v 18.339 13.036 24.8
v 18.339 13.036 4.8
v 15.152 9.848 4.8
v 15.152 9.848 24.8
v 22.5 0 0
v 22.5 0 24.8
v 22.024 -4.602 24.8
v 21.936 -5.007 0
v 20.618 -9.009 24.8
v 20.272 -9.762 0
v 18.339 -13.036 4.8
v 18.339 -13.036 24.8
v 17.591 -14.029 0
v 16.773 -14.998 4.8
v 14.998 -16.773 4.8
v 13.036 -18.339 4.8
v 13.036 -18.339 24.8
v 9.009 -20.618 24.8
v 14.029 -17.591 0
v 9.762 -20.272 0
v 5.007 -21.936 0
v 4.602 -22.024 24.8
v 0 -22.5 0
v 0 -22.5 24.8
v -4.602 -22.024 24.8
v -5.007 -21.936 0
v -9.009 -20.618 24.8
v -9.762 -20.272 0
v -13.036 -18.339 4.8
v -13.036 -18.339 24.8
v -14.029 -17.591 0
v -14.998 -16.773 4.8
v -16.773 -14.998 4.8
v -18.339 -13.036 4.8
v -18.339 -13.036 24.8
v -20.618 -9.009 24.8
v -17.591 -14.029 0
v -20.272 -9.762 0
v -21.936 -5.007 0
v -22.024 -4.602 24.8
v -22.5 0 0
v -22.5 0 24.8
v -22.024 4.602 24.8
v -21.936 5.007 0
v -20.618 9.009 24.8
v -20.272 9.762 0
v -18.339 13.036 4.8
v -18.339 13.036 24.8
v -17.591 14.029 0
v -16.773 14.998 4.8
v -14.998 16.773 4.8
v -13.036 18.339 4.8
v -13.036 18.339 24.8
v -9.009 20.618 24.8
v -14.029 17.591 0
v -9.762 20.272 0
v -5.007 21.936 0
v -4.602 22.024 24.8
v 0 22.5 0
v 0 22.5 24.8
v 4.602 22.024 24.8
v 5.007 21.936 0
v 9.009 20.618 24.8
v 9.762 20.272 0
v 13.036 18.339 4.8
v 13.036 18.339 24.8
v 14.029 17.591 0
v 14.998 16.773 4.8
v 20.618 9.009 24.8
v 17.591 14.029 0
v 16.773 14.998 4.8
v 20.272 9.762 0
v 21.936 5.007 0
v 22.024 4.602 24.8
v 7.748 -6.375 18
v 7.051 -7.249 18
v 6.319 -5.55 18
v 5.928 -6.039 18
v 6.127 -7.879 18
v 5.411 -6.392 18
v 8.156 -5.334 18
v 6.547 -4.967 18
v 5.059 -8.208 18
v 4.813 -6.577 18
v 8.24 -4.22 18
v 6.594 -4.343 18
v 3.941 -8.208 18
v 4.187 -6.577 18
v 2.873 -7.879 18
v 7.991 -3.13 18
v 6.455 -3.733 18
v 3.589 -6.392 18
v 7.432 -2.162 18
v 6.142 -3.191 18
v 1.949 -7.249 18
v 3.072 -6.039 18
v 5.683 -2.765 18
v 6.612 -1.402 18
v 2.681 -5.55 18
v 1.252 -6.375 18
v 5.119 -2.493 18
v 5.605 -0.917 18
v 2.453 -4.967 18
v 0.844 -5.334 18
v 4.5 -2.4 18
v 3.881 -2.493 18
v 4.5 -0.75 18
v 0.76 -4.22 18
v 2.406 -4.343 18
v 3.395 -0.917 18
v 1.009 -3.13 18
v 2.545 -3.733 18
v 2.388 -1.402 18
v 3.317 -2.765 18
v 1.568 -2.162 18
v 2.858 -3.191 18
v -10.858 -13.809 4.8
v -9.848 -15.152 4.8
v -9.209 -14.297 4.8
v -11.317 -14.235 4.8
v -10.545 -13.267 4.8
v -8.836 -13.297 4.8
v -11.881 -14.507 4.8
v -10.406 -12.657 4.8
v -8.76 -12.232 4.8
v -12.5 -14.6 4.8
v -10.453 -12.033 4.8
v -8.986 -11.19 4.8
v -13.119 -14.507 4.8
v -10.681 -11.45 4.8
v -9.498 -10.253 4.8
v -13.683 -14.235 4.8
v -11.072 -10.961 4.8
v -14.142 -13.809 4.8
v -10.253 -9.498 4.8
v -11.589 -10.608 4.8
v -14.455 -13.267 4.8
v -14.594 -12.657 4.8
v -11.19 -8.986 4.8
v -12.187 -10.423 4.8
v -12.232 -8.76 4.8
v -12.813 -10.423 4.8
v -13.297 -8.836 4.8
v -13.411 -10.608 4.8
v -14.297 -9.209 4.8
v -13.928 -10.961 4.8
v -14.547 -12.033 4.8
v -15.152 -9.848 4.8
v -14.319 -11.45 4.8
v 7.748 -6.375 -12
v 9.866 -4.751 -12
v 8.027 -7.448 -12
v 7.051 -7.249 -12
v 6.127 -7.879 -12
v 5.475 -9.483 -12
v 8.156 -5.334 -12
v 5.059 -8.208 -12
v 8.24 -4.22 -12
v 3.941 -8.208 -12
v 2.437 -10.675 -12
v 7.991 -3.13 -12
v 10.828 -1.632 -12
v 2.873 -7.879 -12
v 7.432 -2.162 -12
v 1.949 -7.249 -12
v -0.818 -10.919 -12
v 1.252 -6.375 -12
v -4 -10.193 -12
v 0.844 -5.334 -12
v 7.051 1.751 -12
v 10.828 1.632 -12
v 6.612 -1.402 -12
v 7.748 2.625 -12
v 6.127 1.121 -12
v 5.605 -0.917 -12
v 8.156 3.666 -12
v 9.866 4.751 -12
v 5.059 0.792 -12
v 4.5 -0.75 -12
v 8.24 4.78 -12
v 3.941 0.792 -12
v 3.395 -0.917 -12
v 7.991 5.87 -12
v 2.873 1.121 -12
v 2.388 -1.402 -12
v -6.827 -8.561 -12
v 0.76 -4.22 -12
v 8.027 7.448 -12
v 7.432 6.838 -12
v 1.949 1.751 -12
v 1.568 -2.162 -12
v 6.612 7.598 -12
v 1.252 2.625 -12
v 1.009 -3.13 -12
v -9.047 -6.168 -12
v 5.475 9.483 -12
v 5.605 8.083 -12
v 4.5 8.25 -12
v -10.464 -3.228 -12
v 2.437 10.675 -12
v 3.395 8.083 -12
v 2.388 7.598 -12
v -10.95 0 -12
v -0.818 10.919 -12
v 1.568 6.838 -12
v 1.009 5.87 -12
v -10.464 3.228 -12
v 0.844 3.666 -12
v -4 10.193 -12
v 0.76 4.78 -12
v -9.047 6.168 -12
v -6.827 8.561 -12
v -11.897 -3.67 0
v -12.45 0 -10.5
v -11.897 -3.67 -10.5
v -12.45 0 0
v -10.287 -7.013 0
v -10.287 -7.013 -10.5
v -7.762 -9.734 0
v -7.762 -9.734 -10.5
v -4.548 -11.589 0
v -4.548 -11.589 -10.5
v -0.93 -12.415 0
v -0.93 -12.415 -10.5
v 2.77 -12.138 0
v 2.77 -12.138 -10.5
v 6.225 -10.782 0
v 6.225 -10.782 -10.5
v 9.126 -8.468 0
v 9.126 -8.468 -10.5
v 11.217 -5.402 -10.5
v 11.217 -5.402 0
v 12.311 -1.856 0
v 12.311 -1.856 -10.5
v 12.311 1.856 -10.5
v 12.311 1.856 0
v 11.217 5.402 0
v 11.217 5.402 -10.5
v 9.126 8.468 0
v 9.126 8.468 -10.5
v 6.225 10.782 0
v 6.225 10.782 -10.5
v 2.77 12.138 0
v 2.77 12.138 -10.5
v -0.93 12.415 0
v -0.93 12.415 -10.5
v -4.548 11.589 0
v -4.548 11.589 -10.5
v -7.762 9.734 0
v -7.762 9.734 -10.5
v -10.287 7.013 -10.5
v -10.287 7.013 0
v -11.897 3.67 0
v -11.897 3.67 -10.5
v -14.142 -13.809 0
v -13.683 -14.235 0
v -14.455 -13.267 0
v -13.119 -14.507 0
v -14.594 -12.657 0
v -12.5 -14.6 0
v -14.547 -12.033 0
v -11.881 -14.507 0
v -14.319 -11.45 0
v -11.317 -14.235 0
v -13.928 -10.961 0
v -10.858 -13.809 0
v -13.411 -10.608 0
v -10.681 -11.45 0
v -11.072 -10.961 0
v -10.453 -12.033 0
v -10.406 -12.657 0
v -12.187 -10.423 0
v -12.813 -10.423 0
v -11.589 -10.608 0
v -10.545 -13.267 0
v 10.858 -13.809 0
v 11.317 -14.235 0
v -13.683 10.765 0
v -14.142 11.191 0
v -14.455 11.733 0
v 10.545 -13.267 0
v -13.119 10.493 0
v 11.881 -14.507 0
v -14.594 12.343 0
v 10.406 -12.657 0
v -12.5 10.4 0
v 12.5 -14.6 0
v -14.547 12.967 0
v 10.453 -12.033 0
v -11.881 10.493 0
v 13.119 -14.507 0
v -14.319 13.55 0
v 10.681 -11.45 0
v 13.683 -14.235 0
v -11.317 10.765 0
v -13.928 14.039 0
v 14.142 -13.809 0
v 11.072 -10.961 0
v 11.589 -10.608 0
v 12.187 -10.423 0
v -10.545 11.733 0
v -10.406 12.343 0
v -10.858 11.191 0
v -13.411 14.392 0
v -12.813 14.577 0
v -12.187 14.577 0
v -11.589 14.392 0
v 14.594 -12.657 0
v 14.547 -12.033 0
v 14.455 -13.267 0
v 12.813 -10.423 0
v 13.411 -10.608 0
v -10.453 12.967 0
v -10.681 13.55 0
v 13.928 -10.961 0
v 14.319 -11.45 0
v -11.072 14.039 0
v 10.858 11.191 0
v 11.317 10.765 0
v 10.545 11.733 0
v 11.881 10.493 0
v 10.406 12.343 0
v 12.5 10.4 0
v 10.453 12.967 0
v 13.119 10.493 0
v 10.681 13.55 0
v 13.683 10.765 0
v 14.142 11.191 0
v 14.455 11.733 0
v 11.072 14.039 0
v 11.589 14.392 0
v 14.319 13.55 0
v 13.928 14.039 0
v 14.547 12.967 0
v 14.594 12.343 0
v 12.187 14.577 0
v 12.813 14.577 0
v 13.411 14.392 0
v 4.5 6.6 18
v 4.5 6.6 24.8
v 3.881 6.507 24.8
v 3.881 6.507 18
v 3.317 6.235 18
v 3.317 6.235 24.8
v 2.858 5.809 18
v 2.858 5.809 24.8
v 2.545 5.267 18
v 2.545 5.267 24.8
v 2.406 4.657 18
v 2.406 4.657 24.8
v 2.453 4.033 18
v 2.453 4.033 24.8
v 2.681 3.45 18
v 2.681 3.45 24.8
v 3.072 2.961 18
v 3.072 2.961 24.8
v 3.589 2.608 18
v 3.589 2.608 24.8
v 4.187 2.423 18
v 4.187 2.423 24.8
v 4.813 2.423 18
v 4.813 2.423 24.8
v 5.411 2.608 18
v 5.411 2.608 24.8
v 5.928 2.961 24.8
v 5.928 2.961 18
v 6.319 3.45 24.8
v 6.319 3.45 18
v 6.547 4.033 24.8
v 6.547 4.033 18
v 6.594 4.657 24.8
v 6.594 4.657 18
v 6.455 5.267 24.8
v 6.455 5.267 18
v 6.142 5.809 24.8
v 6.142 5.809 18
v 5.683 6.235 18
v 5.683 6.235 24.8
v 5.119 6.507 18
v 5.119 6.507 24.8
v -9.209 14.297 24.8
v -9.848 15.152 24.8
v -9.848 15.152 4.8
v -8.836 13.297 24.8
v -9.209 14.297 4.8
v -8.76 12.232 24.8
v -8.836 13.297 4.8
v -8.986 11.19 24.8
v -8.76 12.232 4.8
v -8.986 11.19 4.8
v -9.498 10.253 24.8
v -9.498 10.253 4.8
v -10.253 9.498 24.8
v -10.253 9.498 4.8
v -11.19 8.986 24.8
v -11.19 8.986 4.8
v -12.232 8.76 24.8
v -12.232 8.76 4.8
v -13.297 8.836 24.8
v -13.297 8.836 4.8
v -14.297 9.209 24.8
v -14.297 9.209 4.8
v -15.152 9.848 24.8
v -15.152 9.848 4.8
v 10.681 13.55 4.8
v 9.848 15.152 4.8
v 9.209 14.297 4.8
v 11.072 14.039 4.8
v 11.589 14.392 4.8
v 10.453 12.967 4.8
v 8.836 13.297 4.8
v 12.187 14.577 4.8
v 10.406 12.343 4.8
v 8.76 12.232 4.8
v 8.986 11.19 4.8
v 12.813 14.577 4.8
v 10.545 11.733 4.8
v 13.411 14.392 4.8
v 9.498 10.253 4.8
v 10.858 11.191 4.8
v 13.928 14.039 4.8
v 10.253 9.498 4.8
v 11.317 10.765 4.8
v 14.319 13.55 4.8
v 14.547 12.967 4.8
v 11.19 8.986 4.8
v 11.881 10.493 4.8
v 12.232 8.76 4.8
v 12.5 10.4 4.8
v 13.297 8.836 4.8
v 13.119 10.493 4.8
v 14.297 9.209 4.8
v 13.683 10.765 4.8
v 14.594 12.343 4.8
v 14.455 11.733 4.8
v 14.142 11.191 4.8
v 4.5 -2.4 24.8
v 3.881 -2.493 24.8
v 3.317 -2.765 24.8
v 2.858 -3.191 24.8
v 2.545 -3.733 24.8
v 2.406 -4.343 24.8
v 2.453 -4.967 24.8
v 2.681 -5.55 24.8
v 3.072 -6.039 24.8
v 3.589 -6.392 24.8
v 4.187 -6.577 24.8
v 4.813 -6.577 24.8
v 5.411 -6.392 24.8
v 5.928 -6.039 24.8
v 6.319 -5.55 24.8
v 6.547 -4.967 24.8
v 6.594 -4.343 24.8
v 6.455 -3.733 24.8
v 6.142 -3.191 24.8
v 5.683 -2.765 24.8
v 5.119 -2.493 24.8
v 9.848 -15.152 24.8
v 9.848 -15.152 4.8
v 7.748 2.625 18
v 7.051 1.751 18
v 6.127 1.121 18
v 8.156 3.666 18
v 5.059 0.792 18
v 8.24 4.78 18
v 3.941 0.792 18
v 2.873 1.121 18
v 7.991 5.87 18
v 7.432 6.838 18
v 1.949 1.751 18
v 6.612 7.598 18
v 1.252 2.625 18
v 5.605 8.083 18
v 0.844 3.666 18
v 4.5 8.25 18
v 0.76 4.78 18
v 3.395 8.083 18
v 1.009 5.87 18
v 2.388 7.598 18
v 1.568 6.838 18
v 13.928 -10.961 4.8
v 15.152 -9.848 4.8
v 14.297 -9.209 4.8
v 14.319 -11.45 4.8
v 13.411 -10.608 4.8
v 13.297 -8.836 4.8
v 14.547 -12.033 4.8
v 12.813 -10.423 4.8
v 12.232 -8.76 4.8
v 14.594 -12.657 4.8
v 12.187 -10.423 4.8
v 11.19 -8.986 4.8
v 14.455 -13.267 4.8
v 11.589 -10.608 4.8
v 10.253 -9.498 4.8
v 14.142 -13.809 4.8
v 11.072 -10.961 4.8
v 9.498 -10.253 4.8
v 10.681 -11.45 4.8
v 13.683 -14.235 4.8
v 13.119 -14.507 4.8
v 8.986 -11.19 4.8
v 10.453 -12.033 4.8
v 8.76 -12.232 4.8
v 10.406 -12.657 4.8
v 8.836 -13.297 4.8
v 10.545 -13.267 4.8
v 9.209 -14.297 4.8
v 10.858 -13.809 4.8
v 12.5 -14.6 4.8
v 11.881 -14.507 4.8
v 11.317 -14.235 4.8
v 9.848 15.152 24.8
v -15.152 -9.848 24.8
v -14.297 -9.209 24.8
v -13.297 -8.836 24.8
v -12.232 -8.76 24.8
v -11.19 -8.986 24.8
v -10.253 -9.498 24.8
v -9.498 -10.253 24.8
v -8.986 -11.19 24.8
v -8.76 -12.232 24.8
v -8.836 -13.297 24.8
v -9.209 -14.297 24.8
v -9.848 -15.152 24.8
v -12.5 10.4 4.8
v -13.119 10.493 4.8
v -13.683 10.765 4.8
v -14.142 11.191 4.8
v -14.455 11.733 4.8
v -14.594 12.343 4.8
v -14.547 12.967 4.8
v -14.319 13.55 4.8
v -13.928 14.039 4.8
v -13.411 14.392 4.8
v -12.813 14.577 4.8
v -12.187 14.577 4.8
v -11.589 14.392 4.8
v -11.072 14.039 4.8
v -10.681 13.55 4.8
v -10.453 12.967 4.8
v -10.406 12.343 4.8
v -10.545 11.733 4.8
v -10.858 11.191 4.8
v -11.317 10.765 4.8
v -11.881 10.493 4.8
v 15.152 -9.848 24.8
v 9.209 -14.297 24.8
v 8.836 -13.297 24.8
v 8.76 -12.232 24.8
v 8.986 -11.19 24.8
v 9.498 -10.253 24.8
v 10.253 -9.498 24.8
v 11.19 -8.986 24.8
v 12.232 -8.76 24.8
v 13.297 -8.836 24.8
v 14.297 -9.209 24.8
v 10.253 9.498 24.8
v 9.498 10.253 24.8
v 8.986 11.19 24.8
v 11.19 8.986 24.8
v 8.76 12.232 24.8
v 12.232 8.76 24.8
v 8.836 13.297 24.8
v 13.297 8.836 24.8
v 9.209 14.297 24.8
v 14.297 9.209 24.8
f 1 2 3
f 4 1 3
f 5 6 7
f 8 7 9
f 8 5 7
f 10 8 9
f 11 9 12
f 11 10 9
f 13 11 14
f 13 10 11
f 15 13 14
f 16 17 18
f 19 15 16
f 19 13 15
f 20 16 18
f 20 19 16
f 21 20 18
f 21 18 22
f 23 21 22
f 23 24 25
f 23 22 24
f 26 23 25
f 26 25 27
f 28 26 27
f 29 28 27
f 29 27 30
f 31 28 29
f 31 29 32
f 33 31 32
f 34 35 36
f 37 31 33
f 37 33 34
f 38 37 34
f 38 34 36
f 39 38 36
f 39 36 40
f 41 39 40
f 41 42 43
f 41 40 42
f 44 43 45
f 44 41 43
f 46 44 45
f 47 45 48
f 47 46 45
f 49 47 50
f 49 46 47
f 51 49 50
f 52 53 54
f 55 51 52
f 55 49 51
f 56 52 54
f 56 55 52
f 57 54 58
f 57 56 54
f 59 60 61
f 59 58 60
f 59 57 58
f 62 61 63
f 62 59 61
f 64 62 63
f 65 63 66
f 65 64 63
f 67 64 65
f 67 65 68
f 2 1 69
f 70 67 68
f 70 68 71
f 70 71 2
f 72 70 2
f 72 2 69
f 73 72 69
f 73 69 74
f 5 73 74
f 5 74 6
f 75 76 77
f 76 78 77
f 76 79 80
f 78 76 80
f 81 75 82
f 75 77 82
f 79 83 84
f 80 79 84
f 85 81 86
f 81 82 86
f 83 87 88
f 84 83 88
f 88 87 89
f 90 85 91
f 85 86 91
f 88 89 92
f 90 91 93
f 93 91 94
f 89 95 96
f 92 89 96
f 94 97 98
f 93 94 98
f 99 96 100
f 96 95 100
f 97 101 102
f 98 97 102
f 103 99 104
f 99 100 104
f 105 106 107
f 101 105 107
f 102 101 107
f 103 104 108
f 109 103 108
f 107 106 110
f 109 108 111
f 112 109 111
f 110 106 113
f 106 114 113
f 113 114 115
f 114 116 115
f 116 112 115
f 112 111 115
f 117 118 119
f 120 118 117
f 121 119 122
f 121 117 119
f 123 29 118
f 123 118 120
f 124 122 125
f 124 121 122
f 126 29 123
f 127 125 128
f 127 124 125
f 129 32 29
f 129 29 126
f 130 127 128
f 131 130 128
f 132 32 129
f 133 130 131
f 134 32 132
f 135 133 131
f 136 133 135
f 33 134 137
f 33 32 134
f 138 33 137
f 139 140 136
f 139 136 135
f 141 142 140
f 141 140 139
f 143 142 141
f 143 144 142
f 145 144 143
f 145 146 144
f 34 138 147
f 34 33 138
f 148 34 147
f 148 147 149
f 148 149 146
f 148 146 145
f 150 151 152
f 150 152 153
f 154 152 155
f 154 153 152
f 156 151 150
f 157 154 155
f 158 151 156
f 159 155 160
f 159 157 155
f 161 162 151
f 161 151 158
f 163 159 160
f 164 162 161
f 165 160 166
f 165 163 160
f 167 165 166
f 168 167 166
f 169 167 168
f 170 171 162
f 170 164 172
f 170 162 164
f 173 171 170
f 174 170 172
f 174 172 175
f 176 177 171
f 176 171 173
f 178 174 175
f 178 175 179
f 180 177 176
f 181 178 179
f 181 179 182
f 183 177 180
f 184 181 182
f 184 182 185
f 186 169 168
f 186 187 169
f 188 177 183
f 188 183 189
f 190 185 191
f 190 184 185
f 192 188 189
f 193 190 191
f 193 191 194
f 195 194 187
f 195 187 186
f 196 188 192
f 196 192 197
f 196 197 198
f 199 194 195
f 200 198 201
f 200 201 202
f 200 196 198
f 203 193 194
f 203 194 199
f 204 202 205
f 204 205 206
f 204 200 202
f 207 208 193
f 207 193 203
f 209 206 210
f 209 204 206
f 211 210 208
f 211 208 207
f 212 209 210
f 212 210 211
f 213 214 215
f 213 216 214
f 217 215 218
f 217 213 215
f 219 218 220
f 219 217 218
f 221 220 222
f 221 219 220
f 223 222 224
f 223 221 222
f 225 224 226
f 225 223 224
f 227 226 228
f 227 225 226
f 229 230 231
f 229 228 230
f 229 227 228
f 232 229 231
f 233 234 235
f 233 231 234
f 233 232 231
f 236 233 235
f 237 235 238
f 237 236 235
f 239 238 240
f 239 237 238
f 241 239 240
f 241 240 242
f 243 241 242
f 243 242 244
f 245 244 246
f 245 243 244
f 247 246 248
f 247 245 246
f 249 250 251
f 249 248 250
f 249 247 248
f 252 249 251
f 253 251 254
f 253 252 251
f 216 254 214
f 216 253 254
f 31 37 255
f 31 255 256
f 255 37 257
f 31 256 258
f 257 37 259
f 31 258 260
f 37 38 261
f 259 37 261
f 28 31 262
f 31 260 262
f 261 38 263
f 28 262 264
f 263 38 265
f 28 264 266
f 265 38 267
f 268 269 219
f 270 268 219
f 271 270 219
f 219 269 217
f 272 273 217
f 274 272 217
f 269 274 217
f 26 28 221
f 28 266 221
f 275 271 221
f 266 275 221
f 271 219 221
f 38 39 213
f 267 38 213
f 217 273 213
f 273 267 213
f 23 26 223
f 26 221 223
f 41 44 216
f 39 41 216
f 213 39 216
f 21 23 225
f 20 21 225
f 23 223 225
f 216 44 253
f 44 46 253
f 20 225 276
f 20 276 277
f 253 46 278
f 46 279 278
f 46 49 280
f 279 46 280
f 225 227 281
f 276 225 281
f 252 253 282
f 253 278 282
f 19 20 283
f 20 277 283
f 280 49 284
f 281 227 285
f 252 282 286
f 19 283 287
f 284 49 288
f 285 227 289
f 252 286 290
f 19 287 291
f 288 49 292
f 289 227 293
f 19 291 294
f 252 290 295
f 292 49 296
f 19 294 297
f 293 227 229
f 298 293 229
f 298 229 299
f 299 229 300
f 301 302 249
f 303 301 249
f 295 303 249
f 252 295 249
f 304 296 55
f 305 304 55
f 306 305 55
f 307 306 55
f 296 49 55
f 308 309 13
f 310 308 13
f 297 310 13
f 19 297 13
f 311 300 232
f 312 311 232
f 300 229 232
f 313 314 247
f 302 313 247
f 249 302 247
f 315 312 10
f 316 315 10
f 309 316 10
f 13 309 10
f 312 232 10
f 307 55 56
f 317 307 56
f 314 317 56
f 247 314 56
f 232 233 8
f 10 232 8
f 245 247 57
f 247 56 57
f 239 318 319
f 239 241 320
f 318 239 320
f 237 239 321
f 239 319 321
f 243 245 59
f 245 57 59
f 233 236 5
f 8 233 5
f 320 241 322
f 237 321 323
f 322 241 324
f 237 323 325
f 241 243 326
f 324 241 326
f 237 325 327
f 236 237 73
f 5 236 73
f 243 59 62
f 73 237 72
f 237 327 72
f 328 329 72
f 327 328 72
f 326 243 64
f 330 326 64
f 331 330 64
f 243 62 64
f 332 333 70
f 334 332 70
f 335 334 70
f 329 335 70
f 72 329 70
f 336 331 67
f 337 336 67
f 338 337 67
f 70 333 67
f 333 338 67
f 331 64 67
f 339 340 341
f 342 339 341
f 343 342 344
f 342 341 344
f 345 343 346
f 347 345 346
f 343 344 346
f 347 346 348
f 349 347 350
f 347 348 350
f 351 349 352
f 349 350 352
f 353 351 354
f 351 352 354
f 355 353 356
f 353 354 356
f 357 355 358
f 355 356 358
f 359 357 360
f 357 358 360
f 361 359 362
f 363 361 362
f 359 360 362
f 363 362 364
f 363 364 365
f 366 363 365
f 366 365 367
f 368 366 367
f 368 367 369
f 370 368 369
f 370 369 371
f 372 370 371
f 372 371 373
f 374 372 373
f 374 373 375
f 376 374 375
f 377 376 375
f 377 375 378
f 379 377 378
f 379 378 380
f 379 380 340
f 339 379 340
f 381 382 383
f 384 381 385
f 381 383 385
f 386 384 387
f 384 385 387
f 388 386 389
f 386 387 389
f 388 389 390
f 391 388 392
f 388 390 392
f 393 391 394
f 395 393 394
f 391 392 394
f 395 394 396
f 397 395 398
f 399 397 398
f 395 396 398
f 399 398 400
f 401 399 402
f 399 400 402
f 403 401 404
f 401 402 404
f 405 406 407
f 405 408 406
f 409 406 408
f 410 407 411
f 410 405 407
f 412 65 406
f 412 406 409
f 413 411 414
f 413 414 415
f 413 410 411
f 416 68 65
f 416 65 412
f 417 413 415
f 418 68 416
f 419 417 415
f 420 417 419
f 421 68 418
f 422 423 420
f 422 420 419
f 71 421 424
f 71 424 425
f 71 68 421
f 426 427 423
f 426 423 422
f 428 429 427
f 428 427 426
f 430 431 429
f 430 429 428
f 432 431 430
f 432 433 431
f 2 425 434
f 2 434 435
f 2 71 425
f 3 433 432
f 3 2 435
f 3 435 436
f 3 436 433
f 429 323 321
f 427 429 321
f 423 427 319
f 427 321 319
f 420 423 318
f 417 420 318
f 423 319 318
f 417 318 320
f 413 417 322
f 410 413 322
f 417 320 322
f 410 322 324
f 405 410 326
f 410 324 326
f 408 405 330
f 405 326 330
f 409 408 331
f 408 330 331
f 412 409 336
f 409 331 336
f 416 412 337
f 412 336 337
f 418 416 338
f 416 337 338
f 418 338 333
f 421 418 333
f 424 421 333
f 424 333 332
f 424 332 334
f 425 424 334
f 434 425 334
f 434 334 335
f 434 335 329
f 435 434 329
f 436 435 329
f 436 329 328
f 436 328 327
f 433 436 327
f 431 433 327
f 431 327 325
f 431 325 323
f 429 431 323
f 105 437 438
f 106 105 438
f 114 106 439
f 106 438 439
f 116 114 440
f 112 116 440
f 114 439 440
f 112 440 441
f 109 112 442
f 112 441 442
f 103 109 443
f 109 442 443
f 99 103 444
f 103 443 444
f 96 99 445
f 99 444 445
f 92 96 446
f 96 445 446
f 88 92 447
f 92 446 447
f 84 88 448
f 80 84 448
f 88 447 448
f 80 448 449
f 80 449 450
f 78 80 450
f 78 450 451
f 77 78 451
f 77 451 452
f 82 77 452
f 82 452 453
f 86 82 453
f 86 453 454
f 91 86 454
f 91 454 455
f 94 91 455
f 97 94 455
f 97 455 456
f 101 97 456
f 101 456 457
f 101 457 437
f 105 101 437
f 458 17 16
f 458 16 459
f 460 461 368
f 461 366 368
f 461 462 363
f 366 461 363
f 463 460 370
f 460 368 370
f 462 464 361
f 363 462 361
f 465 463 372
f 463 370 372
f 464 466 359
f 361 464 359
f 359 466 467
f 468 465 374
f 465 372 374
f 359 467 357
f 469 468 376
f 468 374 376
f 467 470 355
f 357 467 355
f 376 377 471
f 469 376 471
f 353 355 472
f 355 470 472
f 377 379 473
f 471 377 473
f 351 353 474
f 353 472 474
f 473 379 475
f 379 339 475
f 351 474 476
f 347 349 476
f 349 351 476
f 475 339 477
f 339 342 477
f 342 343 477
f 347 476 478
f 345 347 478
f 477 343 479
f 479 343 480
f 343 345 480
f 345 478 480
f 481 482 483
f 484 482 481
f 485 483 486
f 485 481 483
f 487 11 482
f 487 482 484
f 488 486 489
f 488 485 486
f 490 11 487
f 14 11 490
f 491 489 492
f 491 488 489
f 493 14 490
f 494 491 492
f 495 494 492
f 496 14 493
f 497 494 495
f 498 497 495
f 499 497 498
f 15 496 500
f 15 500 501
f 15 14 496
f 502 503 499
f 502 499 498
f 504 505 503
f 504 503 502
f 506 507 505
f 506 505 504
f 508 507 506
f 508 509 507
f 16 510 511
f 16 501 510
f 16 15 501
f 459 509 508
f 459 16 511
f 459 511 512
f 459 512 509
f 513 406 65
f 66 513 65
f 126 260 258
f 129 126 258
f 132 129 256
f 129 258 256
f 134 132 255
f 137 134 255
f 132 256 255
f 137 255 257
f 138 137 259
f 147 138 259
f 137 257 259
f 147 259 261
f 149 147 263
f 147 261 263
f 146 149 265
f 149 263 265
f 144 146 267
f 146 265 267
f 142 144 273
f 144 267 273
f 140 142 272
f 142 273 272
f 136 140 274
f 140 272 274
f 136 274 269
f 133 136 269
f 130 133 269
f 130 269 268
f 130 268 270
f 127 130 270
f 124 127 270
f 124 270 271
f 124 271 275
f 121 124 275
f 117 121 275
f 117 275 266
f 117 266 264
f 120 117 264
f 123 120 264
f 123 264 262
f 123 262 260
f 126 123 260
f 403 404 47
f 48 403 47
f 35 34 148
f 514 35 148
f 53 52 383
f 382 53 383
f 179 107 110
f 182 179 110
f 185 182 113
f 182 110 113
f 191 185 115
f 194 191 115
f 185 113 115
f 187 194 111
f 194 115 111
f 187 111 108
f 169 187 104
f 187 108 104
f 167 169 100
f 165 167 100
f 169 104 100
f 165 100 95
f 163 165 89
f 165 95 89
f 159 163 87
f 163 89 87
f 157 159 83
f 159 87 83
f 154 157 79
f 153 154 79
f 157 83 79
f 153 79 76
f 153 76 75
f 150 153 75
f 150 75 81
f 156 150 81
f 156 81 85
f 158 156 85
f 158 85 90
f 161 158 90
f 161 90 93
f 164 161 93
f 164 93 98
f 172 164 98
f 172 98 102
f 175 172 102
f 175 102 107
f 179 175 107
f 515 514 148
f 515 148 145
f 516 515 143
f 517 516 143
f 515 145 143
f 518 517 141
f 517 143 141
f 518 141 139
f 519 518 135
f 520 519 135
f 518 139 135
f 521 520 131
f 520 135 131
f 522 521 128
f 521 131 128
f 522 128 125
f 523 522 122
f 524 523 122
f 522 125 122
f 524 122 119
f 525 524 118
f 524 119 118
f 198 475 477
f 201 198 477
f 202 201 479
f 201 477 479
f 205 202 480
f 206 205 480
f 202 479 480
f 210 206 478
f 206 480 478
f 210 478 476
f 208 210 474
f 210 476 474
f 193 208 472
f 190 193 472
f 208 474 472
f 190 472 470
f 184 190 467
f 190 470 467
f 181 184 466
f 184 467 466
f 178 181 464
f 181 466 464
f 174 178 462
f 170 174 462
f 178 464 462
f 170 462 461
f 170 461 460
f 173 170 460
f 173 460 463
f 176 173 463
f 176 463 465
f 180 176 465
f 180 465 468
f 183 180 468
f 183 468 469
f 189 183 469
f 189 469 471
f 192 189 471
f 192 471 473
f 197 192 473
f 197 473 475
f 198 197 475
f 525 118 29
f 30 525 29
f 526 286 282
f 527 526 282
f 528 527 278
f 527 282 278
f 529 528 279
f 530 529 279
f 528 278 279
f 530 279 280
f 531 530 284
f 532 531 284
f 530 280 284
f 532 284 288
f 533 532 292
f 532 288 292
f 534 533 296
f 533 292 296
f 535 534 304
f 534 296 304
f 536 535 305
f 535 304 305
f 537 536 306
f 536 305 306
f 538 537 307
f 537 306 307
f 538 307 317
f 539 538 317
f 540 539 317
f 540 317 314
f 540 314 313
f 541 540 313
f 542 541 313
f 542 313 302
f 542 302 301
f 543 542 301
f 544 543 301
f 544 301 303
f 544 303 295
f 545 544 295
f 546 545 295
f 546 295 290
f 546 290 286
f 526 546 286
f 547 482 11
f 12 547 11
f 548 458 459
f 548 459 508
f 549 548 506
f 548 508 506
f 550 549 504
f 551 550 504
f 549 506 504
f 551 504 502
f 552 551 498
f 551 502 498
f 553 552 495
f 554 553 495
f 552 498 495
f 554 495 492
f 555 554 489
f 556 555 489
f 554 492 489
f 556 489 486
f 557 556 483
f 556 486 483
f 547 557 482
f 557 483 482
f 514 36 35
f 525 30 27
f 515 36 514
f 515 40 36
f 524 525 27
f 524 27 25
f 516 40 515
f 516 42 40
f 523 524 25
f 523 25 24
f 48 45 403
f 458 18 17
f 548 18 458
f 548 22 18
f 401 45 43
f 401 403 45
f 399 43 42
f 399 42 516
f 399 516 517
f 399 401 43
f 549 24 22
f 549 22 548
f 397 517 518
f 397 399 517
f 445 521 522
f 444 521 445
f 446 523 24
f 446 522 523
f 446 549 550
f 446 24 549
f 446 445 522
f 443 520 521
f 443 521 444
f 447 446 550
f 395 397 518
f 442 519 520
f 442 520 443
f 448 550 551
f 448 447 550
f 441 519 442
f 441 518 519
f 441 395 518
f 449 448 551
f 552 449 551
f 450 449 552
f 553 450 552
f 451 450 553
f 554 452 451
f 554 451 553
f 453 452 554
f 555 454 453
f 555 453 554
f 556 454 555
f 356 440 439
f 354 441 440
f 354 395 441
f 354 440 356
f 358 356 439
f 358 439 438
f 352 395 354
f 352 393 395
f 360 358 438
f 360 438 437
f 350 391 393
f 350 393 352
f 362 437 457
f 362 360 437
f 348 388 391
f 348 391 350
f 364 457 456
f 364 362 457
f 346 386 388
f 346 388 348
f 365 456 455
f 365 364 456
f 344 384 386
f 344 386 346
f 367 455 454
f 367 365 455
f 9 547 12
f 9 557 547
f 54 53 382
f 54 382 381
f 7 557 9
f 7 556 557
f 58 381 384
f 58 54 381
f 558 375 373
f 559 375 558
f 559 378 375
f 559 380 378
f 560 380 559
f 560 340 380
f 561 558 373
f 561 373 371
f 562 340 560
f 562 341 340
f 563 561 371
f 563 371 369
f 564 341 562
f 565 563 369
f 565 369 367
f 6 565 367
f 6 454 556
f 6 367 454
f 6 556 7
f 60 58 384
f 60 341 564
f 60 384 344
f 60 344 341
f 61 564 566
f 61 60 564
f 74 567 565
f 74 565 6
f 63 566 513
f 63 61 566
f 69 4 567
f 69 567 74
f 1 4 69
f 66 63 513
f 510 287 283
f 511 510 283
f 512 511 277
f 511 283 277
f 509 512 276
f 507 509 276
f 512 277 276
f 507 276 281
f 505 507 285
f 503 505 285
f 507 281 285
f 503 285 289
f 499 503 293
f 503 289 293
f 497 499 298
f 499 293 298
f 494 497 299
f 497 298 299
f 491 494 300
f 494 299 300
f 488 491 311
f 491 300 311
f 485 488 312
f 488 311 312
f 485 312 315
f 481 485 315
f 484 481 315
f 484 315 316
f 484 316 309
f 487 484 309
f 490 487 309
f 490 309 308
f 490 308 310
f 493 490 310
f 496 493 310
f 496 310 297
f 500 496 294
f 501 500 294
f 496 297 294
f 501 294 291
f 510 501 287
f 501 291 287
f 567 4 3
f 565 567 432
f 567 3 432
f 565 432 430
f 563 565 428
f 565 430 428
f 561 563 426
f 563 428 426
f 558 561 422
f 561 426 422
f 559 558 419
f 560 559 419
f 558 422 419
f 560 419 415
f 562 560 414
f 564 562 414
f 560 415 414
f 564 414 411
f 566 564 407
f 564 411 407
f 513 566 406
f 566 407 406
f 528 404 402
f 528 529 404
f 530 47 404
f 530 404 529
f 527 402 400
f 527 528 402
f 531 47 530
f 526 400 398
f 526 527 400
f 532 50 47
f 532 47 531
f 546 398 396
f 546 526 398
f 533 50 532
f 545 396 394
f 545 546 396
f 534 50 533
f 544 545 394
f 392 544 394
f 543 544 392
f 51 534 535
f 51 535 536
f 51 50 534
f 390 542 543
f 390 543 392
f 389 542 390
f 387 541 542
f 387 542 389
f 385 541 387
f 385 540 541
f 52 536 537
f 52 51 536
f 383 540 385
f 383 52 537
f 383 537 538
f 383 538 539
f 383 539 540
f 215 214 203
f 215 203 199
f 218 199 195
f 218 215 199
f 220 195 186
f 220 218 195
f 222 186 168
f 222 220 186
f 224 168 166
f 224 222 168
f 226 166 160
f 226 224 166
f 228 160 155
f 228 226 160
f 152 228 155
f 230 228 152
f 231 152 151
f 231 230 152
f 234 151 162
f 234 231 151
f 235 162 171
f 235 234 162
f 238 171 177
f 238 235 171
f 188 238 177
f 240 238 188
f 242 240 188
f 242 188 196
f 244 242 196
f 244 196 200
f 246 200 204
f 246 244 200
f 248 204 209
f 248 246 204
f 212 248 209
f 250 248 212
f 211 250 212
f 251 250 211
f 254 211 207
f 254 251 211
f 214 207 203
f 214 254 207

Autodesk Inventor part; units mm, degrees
ref_plane "YZ Plane" through (0, 0, 0) normal (1, 0, 0) x (0, 1, 0)
ref_plane "XZ Plane" through (0, 0, 0) normal (0, 1, 0) x (-1, 0, 0)
ref_plane "XY Plane" through (0, 0, 0) normal (0, 0, 1) x (1, 0, 0)
sketch "Sketch1" plane through (0, 0, 0) normal (0, 0, 1) x (1, 0, 0)
  circle A0 centre (0, 0) radius 22.5
  dimension "d0" = 45
extrude "Extrusion1" add sketch "Sketch1" along normal blind 24.8
sketch "Sketch2" plane through (0, 0, 0) normal (0, 0, -1) x (-1, 0, 0)
  circle A0 centre (0, 0) radius 12.45
  dimension "d3" = 24.9
extrude "Extrusion2" add sketch "Sketch2" along normal blind 12
sketch "Sketch3" plane through (0, 0, 24.8) normal (0, 0, 1) x (1, 0, 0)
  line L0 (12.5, -12.5) -> (-12.5, -12.5) construction
  line L1 (-12.5, -12.5) -> (-12.5, 12.5) construction
  line L2 (-12.5, 12.5) -> (12.5, 12.5) construction
  line L3 (12.5, 12.5) -> (12.5, -12.5) construction
  line L4 (12.5, -12.5) -> (-12.5, 12.5) construction
  line L5 (-12.5, -12.5) -> (12.5, 12.5) construction
  point P0 (0, 0)
  dimension "d6" = 25
  dimension "d7" = 25
hole "Hole1" at (-12.5, 12.5, 24.8) at (12.5, 12.5, 24.8) at (12.5, -12.5, 24.8) at (-12.5, -12.5, 24.8) direction (0, 0, -1) diameter 4.2 end through all counterbore diameter 7.5 counterbore depth 20
sketch "Sketch4" plane through (0, 0, 24.8) normal (0, 0, 1) x (1, 0, 0)
  line L0 (-13.2583, 18.5616) -> (-9.8483, 15.1517)
  line L1 (-9.8483, 15.1517) -> (-15.1517, 9.8483)
  line L2 (-15.1517, 9.8483) -> (-18.5616, 13.2583)
  line L3 (-18.5616, 13.2583) -> (-13.2583, 18.5616)
  line L4 (-13.2583, 18.5616) -> (-15.1517, 9.8483) construction
  line L5 (-9.8483, 15.1517) -> (-18.5616, 13.2583) construction
  circle A0 centre (-12.5, 12.5) radius 3.75 projected
  circle A1 centre (0, 0) radius 22.5 projected
  circle A2 centre (-12.5, 12.5) radius 3.75 construction
  line L6 (-14.205, 14.205) -> (-12.5, 12.5) construction
  point P0 (-18.339, 13.0357)
  point P1 (-13.0357, 18.339)
extrude "Extrusion3" cut sketch "Sketch4" against normal up to surface (20 mm away) contours L0 A0 L2 A1 | L1 A0 picked at (-13.4167, 17.3703) picked at (-13.3264, 14.7238)
pattern_circular "Circular Pattern1" count 4 over 360 about axis through (0, 0, 0) along (0, 0, 1) of "Extrusion3"
chamfer "Chamfer1" distance 1.5 angle 45 1 edges at (12.45, 0, -12)
sketch "Sketch5" plane through (0, 0, -12) normal (0, 0, -1) x (-1, 0, 0)
  line L0 (0, 12) -> (-12, 12) construction
  line L1 (-12, 12) -> (-12, -32.1468) construction
  line L2 (-12, -32.1468) -> (0, -32.1468) construction
  line L3 (0, -32.1468) -> (0, 12) construction
  circle A0 centre (-4.5, 4.5) radius 3.75 construction
  circle A1 centre (-4.5, -4.5) radius 3.75 construction
  line L4 (-4.5, -4.5) -> (-4.5, 4.5) construction
  circle A2 centre (0, 0) radius 10.95 construction
  line L5 (31.5, 0) -> (-31.5, 0) construction
  dimension "d23" = 12
  dimension "d24" = 12
  dimension "d25" = 7.5
  dimension "d29" = 9
  dimension "d30" = 4.5
hole "Hole2" at (4.5, -4.5, -12) at (4.5, 4.5, -12) direction (0, 0, 1) diameter 4.2 end through all counterbore diameter 7.5 counterbore depth 30
properties part number "StageConnection" material "Aluminum 6061"
